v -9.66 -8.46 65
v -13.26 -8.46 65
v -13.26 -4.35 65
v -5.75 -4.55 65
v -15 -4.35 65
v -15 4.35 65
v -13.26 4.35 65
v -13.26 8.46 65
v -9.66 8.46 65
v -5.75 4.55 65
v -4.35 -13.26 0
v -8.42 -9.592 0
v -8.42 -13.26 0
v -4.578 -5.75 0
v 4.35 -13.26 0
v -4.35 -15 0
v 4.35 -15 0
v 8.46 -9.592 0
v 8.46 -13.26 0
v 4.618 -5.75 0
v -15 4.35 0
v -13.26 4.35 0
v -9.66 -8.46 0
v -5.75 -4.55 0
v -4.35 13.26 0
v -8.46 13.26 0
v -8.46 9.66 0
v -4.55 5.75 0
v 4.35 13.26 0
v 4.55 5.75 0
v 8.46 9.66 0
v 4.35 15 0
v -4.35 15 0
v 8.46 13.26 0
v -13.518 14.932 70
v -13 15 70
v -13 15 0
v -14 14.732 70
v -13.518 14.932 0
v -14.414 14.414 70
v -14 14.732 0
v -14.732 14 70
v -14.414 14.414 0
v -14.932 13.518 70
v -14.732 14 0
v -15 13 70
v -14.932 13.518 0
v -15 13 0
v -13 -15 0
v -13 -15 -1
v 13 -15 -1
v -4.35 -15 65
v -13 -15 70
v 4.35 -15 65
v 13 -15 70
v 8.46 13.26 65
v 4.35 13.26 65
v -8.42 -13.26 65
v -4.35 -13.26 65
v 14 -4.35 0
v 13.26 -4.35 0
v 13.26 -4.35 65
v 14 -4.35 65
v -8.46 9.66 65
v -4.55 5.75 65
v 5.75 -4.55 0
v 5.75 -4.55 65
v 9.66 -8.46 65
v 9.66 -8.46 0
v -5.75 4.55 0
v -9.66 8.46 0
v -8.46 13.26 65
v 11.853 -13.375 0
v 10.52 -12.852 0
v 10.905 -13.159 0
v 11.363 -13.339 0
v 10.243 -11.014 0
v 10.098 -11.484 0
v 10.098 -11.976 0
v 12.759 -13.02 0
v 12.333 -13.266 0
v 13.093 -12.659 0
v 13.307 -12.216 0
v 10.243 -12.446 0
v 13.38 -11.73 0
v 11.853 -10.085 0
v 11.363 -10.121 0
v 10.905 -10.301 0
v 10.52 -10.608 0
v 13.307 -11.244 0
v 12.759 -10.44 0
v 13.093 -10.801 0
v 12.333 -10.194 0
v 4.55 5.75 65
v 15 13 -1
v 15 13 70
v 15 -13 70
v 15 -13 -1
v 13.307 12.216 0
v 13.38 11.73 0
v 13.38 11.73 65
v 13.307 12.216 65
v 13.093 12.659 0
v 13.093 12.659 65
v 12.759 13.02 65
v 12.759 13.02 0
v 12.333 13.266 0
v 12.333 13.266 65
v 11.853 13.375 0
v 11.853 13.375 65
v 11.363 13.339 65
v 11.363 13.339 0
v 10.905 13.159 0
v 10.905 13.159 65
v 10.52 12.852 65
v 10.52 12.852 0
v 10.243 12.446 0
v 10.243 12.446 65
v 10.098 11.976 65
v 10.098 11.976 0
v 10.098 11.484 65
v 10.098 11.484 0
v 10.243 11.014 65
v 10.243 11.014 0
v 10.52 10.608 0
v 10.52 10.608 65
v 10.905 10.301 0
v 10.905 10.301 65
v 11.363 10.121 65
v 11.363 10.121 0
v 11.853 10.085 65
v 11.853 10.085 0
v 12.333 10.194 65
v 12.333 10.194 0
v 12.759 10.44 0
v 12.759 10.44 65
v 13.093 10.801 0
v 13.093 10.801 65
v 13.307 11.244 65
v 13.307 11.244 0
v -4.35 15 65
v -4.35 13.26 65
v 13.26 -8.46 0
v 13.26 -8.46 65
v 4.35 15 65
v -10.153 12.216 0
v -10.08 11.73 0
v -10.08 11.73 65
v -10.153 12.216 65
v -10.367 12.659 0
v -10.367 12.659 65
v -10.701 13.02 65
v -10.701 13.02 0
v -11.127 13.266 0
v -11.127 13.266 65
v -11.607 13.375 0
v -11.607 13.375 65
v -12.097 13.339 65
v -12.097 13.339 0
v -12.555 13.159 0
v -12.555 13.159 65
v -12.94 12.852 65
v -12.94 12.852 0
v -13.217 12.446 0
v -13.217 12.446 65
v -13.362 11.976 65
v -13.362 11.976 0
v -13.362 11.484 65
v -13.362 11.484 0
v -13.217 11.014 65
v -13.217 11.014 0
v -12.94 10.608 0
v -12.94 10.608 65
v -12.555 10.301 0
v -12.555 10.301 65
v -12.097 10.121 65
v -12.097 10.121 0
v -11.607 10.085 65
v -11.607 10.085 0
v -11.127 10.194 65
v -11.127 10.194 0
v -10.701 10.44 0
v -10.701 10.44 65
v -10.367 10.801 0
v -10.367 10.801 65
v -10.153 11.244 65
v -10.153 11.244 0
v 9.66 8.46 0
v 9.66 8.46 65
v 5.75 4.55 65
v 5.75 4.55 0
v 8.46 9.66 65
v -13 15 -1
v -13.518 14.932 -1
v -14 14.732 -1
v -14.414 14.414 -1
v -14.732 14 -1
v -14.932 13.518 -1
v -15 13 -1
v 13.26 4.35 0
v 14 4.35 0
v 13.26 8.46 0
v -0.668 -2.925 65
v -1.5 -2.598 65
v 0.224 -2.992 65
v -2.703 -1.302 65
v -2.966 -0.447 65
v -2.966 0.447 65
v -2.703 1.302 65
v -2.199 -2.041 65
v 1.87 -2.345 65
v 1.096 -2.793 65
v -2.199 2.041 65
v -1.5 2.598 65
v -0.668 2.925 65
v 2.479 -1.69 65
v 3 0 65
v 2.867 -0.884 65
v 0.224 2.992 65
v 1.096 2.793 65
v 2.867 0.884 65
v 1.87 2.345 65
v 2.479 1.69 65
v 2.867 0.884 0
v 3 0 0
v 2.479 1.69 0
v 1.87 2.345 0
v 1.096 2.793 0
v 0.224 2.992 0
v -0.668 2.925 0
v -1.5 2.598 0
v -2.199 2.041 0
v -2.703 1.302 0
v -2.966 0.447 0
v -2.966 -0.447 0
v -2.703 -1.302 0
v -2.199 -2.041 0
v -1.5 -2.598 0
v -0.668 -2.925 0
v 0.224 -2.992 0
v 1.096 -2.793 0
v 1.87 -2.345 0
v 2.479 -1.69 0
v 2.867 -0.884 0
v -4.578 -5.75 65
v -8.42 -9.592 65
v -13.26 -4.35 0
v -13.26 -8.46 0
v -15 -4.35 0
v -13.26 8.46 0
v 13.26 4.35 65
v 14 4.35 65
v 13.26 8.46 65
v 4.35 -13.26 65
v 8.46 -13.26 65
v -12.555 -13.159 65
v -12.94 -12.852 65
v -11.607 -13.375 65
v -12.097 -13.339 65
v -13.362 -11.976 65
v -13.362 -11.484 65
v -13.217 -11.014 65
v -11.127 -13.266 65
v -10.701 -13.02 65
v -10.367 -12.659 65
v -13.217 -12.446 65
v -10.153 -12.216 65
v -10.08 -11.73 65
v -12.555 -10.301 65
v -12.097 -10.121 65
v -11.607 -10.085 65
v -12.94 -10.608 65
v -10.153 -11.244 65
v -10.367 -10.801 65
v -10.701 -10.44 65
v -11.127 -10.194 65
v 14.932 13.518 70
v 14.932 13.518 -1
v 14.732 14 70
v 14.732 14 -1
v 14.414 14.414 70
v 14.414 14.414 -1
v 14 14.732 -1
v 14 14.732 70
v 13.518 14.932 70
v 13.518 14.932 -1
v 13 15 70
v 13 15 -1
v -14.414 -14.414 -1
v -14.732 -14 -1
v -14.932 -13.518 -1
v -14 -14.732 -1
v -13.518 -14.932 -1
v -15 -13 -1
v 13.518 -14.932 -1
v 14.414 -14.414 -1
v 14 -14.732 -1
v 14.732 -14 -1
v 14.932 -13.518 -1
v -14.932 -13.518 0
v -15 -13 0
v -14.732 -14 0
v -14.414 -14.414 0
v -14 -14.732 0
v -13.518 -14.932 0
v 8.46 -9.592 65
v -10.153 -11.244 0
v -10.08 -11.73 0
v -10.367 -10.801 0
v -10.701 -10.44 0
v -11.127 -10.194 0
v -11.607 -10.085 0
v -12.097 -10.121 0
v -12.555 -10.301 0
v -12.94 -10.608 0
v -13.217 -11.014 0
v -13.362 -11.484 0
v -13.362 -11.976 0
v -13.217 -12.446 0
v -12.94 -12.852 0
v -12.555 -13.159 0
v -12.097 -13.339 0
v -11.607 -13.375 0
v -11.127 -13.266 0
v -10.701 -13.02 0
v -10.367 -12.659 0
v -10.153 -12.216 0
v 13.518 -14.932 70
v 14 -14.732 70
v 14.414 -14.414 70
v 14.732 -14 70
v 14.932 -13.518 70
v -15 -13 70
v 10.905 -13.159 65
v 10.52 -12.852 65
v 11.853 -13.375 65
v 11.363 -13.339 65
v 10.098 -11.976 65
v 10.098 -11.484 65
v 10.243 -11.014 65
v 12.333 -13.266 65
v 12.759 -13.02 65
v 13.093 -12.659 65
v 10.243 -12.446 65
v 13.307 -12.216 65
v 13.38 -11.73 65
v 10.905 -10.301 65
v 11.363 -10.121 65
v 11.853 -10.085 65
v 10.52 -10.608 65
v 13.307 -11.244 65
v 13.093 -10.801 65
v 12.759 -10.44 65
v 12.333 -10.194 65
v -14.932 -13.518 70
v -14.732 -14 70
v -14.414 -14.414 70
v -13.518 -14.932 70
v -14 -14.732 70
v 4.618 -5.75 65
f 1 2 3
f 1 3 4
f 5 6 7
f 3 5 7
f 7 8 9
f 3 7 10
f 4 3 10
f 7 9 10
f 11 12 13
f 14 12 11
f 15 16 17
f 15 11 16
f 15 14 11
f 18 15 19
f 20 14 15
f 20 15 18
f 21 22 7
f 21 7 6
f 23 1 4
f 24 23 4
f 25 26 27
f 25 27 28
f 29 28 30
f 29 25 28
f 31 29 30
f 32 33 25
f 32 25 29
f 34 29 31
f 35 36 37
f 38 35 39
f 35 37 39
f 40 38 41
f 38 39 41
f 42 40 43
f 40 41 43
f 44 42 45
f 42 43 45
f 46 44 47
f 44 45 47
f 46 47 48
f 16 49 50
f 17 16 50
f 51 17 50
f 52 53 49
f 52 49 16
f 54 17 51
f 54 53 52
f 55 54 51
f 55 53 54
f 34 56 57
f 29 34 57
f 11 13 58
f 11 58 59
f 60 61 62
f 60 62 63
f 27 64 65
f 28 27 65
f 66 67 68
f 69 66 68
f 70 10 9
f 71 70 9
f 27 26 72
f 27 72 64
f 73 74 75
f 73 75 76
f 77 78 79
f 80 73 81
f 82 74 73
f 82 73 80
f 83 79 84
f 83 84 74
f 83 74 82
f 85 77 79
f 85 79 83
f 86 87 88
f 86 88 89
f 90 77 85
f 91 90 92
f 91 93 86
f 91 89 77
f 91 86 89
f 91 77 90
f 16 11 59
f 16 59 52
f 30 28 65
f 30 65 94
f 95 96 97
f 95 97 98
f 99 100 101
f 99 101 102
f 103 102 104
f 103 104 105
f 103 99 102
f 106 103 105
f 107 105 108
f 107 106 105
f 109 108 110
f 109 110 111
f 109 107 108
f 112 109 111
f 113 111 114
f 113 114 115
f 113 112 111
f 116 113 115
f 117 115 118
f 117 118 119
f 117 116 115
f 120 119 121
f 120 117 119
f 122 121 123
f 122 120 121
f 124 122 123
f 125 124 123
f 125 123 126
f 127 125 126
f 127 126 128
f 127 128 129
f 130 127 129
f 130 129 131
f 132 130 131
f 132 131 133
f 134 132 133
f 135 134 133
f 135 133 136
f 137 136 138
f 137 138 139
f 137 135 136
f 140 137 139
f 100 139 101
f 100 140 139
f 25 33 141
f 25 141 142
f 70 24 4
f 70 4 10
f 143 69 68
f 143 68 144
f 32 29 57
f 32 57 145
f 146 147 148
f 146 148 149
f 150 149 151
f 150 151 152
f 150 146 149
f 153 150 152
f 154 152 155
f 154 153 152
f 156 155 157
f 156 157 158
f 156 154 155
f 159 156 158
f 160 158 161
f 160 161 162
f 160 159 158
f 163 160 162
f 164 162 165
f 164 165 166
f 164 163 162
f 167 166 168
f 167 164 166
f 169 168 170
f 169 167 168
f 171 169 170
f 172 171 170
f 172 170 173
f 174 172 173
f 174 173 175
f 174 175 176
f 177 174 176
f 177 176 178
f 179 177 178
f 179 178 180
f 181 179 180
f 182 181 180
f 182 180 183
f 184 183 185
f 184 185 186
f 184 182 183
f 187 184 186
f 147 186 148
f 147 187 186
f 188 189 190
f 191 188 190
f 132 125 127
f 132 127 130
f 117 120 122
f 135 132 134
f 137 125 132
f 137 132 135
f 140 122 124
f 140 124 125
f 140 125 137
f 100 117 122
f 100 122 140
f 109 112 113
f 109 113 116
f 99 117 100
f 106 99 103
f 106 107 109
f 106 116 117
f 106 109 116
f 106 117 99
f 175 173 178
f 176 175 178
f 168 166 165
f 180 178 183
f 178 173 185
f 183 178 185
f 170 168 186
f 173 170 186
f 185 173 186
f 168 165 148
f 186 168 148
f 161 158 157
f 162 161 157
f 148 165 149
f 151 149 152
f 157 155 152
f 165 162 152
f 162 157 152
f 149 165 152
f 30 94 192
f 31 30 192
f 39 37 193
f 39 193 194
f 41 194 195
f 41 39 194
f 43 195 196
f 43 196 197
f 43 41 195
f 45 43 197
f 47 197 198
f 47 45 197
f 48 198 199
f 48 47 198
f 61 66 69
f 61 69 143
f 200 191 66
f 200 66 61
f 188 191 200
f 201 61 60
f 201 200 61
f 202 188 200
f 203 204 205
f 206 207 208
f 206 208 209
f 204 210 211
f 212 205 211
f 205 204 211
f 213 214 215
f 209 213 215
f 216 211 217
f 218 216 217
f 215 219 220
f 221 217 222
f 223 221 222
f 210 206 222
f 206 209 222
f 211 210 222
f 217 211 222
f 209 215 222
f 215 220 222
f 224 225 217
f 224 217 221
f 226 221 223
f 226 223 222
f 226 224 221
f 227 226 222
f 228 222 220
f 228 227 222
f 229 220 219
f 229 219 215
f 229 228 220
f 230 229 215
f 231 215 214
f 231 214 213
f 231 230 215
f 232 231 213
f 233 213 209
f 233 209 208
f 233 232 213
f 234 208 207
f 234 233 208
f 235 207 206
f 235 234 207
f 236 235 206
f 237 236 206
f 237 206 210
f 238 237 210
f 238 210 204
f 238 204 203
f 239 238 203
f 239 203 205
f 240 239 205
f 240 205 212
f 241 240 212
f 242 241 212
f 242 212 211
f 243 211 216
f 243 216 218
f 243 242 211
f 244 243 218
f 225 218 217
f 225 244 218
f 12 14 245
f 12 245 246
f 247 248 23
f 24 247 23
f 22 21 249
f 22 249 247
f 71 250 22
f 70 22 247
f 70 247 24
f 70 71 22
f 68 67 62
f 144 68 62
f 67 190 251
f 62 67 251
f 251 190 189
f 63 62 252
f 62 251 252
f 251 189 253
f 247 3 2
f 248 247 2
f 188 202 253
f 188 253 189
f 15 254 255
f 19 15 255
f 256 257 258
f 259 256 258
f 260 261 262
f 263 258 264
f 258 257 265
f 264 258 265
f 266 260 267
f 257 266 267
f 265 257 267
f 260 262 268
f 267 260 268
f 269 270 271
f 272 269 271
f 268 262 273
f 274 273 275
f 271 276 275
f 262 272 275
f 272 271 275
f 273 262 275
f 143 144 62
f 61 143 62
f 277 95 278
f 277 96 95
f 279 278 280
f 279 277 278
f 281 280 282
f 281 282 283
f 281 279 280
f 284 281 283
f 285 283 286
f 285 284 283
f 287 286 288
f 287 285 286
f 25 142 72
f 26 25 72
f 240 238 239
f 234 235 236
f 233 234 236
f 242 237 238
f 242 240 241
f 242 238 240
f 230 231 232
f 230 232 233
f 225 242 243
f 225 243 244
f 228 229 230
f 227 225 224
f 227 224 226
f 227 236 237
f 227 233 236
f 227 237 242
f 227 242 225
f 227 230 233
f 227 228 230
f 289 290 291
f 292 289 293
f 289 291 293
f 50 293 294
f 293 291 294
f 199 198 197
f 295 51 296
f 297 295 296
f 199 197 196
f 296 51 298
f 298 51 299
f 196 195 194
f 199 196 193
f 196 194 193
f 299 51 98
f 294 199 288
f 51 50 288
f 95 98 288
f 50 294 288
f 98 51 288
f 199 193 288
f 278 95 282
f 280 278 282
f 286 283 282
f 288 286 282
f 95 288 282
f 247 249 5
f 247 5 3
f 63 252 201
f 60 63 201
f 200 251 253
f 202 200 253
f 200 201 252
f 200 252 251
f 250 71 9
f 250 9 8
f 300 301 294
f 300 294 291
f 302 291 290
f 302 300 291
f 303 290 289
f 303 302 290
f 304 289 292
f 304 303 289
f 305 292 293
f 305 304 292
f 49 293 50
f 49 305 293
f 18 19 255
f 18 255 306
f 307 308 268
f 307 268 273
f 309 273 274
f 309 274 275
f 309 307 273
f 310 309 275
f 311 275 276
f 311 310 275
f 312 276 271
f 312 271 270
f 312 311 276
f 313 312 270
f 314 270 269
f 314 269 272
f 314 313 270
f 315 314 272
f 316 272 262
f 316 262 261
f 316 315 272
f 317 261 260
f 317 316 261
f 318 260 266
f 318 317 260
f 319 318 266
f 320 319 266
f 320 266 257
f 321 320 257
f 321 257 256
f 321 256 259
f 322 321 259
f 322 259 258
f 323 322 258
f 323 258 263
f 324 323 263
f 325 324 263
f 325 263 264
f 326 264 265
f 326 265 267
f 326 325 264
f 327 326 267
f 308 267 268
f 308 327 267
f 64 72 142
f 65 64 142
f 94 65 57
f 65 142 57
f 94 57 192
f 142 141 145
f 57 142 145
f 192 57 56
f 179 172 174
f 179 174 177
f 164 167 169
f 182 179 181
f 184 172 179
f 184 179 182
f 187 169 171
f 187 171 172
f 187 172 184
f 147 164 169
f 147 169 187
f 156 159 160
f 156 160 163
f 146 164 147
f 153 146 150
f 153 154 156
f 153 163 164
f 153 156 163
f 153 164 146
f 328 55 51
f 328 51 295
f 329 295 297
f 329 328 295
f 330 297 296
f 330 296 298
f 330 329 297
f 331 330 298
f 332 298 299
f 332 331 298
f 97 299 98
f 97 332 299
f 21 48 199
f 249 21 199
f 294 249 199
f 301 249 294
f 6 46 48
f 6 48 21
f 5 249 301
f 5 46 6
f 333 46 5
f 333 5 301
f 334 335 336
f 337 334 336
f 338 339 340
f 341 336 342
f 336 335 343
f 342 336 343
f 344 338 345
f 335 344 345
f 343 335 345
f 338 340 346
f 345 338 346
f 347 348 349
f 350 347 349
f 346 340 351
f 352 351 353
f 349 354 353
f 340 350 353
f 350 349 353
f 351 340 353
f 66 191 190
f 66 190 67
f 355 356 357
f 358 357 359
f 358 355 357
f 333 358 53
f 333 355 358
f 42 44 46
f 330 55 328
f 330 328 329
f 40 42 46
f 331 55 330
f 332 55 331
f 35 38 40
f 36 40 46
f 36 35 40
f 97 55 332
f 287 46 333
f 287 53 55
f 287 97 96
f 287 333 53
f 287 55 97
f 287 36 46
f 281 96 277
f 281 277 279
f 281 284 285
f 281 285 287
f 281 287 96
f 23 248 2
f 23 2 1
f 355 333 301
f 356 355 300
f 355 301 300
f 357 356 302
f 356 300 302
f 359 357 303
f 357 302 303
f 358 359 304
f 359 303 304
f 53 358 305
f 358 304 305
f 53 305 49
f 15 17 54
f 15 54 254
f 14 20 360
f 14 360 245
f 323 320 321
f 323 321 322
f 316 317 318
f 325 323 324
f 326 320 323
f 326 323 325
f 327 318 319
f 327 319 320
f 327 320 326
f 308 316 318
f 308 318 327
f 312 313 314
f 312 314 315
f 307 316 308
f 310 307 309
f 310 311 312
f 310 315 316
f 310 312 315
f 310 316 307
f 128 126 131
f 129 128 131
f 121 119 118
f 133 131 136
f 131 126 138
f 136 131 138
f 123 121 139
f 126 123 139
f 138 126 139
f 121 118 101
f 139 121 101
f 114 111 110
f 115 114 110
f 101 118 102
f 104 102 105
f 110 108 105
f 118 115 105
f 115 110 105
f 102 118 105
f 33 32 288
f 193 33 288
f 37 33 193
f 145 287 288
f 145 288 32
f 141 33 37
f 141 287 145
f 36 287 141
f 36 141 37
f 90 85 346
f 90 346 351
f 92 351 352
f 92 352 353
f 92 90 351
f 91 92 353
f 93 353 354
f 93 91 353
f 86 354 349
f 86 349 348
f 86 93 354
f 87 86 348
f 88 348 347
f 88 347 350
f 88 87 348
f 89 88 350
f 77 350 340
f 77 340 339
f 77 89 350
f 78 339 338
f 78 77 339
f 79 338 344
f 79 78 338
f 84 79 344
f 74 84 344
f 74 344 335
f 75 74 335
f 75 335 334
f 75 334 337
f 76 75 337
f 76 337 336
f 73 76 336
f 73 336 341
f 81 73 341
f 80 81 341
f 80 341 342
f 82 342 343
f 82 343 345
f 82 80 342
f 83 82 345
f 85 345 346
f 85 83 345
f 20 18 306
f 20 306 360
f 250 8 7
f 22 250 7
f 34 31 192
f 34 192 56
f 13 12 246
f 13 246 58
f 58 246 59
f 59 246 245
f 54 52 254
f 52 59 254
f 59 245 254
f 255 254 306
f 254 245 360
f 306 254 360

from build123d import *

# Parameters (mm, degrees)
SKETCH1_R                    = 3
SKETCH1_R_2                  = 1.65
BOSS_EXTRUDE1_DEPTH          = 65
FILLET1_R                    = 2
ESTRUSIONE_ESTRUSIONE1_DEPTH = 5
ESTRUSIONE_ESTRUSIONE2_DEPTH = 1
SCHIZZO3_W                   = 65
SCHIZZO3_H                   = 8.7
ESTRUSIONE_ESTRUSIONE3_DEPTH = 1


with BuildPart() as part:
    # Sketch1 → Boss-Extrude1 (new body)
    with BuildSketch(Plane.XY):
        Polygon((-8.46, 9.66), (-4.55, 5.75), (4.55, 5.75), (8.46, 9.66), (8.46, 13.26), (4.35, 13.26), (4.35, 15), (15, 15), (15, 4.35), (13.26, 4.35), (13.26, 8.46), (9.66, 8.46), (5.75, 4.55), (5.75, -4.55), (9.66, -8.46), (13.26, -8.46), (13.26, -4.35), (15, -4.35), (15, -15), (4.35, -15), (4.35, -13.26), (8.46, -13.26), (8.46, -9.59186747), (4.61813253, -5.75), (-4.578313253, -5.75), (-8.420180723, -9.59186747), (-8.420180723, -13.26), (-4.35, -13.26), (-4.35, -15), (-15, -15), (-15, -4.35), (-13.26, -4.35), (-13.26, -8.46), (-9.66, -8.46), (-5.75, -4.55), (-5.75, 4.55), (-9.66, 8.46), (-13.26, 8.46), (-13.26, 4.35), (-15, 4.35), (-15, 15), (-4.35, 15), (-4.35, 13.26), (-8.46, 13.26), align=None)
        Circle(SKETCH1_R, mode=Mode.SUBTRACT)
        with Locations((11.73, 11.73)):
            Circle(SKETCH1_R_2, mode=Mode.SUBTRACT)
        with Locations((11.73, -11.73)):
            Circle(SKETCH1_R_2, mode=Mode.SUBTRACT)
        with Locations((-11.73, -11.73)):
            Circle(SKETCH1_R_2, mode=Mode.SUBTRACT)
        with Locations((-11.73, 11.73)):
            Circle(SKETCH1_R_2, mode=Mode.SUBTRACT)
    extrude(amount=BOSS_EXTRUDE1_DEPTH)

    # Fillet1
    fillet1_edges = [part.edges().sort_by_distance(p)[0] for p in [
        (15, 15, 32.5),
        (15, -15, 32.5),
        (-15, -15, 32.5),
        (-15, 15, 32.5),
    ]]
    fillet(fillet1_edges, radius=FILLET1_R)

    # Schizzo1 → Estrusione-Estrusione1 (add)
    with BuildSketch(Plane.XY.offset(65)):
        with BuildLine():
            Line((13, 15), (4.35, 15))
            Line((4.35, 15), (-4.35, 15))
            Line((-4.35, 15), (-13, 15))
            ThreePointArc((-13, 15), (-14.414213562, 14.414213562), (-15, 13))
            Line((-15, 13), (-15, 4.35))
            Line((-15, 4.35), (-15, -4.35))
            Line((-15, -4.35), (-15, -13))
            ThreePointArc((-15, -13), (-14.414213562, -14.414213562), (-13, -15))
            Line((-13, -15), (-4.35, -15))
            Line((-4.35, -15), (4.35, -15))
            Line((4.35, -15), (13, -15))
            ThreePointArc((13, -15), (14.414213562, -14.414213562), (15, -13))
            Line((15, -13), (15, -4.35))
            Line((15, -4.35), (15, 4.35))
            Line((15, 4.35), (15, 13))
            ThreePointArc((15, 13), (14.414213562, 14.414213562), (13, 15))
        make_face()
    extrude(amount=ESTRUSIONE_ESTRUSIONE1_DEPTH)

    # Schizzo2 → Estrusione-Estrusione2 (add)
    with BuildSketch(Plane(origin=(0, 0, 0), x_dir=(-1, 0, 0), z_dir=(0, 0, -1))):
        with BuildLine():
            Line((-13, 15), (13, 15))
            ThreePointArc((13, 15), (14.414213562, 14.414213562), (15, 13))
            Line((15, 13), (15, -13))
            ThreePointArc((15, -13), (14.414213562, -14.414213562), (13, -15))
            Line((13, -15), (-13, -15))
            ThreePointArc((-13, -15), (-14.414213562, -14.414213562), (-15, -13))
            Line((-15, -13), (-15, 13))
            ThreePointArc((-15, 13), (-14.414213562, 14.414213562), (-13, 15))
        make_face()
    extrude(amount=ESTRUSIONE_ESTRUSIONE2_DEPTH)

    # Schizzo3 → Estrusione-Estrusione3 (add)
    with BuildSketch(Plane(origin=(15, 0, 0), x_dir=(0, 0, -1), z_dir=(1, 0, 0))):
        with Locations((-32.5, 0)):
            Rectangle(SCHIZZO3_W, SCHIZZO3_H)
    extrude(amount=-ESTRUSIONE_ESTRUSIONE3_DEPTH)


solid = part.part
